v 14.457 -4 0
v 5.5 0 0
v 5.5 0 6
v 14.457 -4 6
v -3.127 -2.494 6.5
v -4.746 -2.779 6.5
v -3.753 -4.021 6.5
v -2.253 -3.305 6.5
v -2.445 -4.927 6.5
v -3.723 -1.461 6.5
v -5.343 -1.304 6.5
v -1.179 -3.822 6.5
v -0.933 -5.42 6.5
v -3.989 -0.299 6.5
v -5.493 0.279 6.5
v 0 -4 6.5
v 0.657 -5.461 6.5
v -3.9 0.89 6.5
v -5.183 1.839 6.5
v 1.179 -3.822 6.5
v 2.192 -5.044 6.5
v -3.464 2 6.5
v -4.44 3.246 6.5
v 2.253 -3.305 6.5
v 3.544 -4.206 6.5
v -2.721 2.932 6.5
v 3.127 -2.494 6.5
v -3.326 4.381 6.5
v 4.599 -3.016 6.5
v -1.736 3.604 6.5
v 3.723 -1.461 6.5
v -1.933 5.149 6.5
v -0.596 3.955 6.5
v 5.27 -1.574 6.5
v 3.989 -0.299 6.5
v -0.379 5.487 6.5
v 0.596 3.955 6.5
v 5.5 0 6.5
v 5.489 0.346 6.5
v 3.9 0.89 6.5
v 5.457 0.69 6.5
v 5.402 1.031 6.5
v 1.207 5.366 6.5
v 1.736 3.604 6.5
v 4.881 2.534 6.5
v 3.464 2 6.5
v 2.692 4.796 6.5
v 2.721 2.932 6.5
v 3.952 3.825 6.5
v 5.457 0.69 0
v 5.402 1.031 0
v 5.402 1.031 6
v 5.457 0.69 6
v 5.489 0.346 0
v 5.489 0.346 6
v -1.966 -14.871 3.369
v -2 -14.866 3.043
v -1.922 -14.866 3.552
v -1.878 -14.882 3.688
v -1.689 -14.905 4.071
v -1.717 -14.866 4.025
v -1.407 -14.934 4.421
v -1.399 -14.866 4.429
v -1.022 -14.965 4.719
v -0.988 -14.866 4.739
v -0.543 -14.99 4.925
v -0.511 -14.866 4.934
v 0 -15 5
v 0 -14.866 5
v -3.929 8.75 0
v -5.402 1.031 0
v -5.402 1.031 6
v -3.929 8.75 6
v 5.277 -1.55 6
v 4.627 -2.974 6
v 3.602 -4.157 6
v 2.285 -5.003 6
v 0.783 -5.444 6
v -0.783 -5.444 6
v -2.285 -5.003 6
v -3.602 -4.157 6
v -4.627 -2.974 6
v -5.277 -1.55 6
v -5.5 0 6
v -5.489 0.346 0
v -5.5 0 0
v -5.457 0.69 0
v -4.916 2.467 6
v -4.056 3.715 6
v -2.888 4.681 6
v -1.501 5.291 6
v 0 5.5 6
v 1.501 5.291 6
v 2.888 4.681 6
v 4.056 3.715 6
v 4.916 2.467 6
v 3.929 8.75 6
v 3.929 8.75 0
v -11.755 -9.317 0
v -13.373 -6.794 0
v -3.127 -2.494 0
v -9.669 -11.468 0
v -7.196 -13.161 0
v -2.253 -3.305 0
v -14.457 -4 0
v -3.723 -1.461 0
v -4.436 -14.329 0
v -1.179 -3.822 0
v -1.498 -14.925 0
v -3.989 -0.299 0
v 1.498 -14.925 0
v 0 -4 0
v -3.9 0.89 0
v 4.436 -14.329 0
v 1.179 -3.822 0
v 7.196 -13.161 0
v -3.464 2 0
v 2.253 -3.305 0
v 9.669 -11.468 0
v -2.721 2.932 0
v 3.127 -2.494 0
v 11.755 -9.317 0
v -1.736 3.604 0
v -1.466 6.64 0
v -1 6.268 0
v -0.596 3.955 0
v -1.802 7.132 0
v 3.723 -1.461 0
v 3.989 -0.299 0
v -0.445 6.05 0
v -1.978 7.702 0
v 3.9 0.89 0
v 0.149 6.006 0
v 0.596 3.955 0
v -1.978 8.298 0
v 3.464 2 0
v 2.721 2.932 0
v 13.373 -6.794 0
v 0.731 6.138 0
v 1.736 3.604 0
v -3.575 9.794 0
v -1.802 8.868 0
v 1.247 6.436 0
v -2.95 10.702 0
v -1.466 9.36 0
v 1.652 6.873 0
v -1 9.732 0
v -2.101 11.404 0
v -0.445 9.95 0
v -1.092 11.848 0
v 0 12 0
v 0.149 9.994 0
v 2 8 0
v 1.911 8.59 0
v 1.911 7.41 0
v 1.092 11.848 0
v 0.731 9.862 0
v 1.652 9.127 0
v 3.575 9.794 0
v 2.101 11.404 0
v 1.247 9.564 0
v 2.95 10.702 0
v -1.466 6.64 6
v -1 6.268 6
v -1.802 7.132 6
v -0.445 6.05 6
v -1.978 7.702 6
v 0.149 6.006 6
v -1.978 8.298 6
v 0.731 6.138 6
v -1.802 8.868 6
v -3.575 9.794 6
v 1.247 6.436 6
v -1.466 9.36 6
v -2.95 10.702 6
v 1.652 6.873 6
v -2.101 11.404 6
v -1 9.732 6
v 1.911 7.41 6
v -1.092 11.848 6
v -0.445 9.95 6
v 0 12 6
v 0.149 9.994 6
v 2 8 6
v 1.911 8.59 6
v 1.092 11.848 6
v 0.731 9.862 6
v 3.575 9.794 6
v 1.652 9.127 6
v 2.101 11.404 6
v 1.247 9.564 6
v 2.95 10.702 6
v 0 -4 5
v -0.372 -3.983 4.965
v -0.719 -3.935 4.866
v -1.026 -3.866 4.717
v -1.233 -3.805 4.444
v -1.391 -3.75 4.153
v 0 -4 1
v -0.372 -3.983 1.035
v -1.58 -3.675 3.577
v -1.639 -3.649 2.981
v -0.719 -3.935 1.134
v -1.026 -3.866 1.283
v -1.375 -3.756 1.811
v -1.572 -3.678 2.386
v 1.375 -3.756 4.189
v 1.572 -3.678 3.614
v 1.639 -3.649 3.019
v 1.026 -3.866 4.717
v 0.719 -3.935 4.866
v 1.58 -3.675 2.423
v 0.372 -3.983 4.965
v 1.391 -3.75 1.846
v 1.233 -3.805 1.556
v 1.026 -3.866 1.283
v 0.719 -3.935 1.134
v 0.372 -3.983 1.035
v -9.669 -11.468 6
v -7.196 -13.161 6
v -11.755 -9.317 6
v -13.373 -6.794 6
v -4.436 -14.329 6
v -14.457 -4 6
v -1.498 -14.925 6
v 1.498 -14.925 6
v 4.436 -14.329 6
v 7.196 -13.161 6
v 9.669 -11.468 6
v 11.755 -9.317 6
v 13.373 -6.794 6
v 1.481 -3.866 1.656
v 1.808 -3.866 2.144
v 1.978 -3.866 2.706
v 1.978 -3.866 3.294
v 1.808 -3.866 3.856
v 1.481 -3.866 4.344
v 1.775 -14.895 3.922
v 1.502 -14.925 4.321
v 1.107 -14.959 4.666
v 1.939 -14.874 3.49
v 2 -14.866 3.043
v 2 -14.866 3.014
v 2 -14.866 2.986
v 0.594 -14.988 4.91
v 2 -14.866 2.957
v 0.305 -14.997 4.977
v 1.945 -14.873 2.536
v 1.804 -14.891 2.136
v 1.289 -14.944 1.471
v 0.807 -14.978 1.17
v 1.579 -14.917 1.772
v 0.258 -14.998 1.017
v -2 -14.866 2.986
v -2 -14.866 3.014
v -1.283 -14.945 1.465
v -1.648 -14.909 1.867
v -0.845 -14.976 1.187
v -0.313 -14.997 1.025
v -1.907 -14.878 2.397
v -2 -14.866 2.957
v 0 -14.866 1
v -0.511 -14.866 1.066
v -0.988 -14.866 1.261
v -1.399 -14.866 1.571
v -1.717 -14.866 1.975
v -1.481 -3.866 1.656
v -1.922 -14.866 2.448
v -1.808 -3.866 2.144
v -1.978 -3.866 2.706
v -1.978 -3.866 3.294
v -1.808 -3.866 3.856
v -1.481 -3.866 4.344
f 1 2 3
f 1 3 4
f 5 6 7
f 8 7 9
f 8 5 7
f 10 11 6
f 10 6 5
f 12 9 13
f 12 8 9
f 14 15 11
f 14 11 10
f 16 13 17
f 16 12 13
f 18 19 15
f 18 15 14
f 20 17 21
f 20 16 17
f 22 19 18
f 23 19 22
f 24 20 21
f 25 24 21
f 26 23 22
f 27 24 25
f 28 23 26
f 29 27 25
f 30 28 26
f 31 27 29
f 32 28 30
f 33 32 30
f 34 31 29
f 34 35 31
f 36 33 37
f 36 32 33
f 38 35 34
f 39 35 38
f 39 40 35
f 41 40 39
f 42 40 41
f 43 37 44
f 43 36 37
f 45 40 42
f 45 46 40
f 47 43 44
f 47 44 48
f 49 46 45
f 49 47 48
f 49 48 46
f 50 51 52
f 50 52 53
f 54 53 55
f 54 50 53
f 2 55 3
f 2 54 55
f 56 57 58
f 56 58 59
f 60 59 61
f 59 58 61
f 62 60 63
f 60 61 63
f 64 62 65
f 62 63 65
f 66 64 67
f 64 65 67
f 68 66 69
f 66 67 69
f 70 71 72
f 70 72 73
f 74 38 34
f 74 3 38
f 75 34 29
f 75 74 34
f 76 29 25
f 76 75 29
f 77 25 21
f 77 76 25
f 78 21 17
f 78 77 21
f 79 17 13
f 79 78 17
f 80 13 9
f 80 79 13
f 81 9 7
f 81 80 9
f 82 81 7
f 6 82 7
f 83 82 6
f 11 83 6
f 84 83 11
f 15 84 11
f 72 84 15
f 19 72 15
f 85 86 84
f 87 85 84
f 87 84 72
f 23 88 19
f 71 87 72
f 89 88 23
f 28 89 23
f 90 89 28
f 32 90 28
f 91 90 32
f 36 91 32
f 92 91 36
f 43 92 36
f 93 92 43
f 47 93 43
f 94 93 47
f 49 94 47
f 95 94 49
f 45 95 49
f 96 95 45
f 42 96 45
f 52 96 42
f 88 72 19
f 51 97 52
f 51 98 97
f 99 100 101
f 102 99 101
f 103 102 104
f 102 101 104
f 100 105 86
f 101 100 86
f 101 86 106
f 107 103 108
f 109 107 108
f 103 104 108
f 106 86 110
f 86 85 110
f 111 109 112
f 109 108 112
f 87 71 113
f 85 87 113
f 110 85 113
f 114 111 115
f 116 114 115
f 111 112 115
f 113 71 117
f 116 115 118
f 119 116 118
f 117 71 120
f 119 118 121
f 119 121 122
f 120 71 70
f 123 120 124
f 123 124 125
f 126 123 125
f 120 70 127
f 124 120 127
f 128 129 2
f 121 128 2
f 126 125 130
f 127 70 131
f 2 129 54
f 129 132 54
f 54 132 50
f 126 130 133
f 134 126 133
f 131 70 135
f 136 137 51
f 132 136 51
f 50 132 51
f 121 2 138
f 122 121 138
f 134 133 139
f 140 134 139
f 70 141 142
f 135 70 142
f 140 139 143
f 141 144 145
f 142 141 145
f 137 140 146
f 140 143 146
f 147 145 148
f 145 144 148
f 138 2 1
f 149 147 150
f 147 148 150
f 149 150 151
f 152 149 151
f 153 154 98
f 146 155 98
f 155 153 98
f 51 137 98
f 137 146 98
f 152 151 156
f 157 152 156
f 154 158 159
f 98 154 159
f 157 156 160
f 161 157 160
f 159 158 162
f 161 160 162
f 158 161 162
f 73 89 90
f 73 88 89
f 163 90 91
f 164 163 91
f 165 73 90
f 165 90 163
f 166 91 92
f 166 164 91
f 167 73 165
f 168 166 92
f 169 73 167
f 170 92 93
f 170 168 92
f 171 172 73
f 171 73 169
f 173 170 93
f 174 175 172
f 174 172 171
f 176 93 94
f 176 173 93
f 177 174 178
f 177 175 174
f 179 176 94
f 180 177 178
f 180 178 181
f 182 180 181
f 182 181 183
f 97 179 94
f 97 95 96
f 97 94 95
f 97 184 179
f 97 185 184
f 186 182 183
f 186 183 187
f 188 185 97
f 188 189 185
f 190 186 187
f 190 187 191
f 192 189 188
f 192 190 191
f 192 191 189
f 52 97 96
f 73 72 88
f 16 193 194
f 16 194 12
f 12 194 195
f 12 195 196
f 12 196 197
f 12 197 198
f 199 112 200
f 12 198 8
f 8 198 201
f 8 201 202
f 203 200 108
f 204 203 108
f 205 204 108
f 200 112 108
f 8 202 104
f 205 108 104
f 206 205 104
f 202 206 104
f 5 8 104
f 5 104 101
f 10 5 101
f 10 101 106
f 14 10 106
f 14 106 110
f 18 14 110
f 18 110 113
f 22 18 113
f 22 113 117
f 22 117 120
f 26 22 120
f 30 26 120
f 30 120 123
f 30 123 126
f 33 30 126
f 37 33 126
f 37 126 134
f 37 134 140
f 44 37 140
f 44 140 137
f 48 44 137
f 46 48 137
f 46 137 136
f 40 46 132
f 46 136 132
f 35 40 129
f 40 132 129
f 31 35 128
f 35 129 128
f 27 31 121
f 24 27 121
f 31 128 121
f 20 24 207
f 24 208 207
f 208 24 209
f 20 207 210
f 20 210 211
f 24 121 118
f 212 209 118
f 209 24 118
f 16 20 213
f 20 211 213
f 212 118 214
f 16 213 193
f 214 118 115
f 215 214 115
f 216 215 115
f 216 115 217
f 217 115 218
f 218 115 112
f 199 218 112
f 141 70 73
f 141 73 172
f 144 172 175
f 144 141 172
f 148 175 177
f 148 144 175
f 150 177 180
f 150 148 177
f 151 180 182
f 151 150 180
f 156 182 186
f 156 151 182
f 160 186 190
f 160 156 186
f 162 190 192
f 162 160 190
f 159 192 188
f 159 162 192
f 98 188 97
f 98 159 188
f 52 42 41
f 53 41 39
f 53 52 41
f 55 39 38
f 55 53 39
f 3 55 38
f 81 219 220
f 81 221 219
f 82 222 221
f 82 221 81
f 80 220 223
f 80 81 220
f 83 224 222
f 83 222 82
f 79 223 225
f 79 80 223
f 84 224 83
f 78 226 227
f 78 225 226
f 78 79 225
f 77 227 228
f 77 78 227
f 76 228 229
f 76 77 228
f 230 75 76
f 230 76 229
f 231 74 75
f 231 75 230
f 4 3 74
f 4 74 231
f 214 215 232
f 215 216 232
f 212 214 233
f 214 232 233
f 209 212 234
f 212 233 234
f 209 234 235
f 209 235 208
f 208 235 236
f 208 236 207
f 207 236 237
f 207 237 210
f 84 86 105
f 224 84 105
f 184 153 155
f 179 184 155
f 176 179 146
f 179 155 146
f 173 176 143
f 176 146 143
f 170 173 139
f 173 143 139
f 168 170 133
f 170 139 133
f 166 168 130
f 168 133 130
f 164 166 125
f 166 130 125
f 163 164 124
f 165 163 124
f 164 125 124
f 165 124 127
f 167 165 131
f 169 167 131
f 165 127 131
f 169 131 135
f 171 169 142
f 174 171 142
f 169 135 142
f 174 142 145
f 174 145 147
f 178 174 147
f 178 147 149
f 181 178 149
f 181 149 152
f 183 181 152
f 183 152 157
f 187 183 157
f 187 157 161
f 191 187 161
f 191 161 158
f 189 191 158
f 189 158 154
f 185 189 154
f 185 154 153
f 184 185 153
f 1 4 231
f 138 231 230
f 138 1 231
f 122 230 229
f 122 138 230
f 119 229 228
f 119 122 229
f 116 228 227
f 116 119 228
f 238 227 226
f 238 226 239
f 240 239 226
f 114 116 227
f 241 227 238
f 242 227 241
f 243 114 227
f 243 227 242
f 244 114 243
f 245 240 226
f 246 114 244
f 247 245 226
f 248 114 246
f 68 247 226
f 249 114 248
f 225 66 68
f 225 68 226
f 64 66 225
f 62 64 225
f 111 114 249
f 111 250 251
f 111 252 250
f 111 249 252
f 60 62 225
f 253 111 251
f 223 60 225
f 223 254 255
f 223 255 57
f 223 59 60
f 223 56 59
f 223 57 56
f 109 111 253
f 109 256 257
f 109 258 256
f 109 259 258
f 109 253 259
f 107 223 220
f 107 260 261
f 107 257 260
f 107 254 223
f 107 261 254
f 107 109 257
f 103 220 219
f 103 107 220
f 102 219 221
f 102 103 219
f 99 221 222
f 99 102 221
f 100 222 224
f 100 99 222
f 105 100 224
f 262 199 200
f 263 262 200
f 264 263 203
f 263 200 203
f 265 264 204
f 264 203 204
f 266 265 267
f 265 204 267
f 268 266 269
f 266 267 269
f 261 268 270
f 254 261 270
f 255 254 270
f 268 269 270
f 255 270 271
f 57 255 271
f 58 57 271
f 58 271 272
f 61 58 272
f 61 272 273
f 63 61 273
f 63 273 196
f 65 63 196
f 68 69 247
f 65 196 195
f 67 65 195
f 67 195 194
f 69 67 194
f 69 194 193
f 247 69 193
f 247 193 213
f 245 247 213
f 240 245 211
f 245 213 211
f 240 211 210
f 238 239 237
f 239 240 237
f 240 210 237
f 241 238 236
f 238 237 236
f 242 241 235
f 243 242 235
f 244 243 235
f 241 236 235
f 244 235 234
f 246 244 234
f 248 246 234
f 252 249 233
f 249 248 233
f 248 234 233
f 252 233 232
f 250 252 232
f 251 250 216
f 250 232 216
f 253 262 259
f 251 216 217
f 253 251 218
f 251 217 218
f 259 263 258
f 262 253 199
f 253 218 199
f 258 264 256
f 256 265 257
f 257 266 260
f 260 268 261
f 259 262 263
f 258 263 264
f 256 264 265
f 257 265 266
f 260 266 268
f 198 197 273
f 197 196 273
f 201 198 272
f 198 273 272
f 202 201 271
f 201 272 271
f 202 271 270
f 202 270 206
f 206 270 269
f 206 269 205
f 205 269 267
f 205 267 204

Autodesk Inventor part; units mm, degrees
ref_plane "YZ Plane" through (0, 0, 0) normal (1, 0, 0) x (0, 1, 0)
ref_plane "XZ Plane" through (0, 0, 0) normal (0, 1, 0) x (-1, 0, 0)
sketch "Sketch1" plane through (0, 0, 0) normal (0, 0, 1) x (1, 0, 0)
  arc A0 (-14.4568, -4) -> (14.4568, -4) centre (0, 0) ccw
  circle A1 centre (0, 0) radius 5.5
  line L0 (0, 0) -> (0, -4)
  line L1 (-5.5, 0) -> (-14.4568, -4)
  line L2 (5.5, 0) -> (14.4568, -4)
  line L3 (0, 0) -> (0, 8)
  circle A2 centre (0, 8) radius 2
  line L4 (-5.4025, 1.0312) -> (-3.9291, 8.75)
  line L5 (3.9291, 8.75) -> (5.4025, 1.0313)
  arc A3 (3.9291, 8.75) -> (-3.9291, 8.75) centre (0, 8) ccw
  line L6 (-2, 14.8661) -> (2, 14.8661)
  line L7 (2, 14.8661) -> (2, -14.8661)
  line L8 (2, -14.8661) -> (-2, -14.8661)
  line L9 (-2, -14.8661) -> (-2, 14.8661)
  line L10 (-2, 14.8661) -> (2, -14.8661) construction
  line L11 (2, 14.8661) -> (-2, -14.8661) construction
  dimension "d0" = 30
  dimension "d1" = 11
  dimension "d2" = 4
  dimension "d3" = 8
  dimension "d4" = 4
extrude "Extrusion1" add sketch "Sketch1" along normal blind 6 contours L1 A1 L9 A0 | L8 A0 | L9 A1 L7 L8 | A1 L9 | L7 A1 L2 A0 | L9 A1 L7 | L4 A3 L9 A1 | L7 A1 | L9 A2 L3 A1 | L7 A3 L5 A1 | A1 L3 A2 L7 | L9 A3 L7 A2
sketch "Sketch2" plane through (0, 0, 6) normal (0, 0, 1) x (1, 0, 0)
  arc A0 (5.5, 0) -> (5.4025, 1.0313) centre (0, 0) ccw projected
  circle A1 centre (0, 0) radius 5.5
  point P0 (5.4025, 1.0313)
extrude "Extrusion2" add sketch "Sketch2" along normal blind 0.5
sketch "Sketch3" plane through (0, 0, 6.5) normal (0, 0, 1) x (1, 0, 0)
  point P0 (0, 0)
hole "Hole2" at (0, 0, 6.5) direction (0, 0, -1) diameter 8 end through all
sketch "Sketch4" plane through (0, 0, 6) normal (0, 0, 1) x (1, 0, 0)
  point P0 (0, 0)
ref_plane "Work Plane1" through (-2, -14.8661, 0) normal (0, 1, 0) x (1, 0, 0)
sketch "Sketch5" plane through (-2, -14.8661, 0) normal (0, 1, 0) x (1, 0, 0)
  line L0 (4, -6) -> (0, -6) projected
  line L1 (2, -6) -> (2, -3)
  point P0 (2, 0)
  dimension "d26" = 3
hole "Hole3" at (0, -14.8661, 3) direction (0, 1, 0) diameter 4 depth 11 tip angle 118
sketch "Sketch6" plane through (-2, -14.8661, 0) normal (0, 1, 0) x (1, 0, 0)
  arc A0 (4, -3) -> (0, -3) centre (2, -3) ccw projected
  circle A1 centre (2, -3) radius 2
  point P0 (2, 0)
hole "Hole4" at (0, -14.8661, 3) direction (0, -1, 0) diameter 4 depth 11 tip angle 118
properties part number "KURBEL PART 8"
